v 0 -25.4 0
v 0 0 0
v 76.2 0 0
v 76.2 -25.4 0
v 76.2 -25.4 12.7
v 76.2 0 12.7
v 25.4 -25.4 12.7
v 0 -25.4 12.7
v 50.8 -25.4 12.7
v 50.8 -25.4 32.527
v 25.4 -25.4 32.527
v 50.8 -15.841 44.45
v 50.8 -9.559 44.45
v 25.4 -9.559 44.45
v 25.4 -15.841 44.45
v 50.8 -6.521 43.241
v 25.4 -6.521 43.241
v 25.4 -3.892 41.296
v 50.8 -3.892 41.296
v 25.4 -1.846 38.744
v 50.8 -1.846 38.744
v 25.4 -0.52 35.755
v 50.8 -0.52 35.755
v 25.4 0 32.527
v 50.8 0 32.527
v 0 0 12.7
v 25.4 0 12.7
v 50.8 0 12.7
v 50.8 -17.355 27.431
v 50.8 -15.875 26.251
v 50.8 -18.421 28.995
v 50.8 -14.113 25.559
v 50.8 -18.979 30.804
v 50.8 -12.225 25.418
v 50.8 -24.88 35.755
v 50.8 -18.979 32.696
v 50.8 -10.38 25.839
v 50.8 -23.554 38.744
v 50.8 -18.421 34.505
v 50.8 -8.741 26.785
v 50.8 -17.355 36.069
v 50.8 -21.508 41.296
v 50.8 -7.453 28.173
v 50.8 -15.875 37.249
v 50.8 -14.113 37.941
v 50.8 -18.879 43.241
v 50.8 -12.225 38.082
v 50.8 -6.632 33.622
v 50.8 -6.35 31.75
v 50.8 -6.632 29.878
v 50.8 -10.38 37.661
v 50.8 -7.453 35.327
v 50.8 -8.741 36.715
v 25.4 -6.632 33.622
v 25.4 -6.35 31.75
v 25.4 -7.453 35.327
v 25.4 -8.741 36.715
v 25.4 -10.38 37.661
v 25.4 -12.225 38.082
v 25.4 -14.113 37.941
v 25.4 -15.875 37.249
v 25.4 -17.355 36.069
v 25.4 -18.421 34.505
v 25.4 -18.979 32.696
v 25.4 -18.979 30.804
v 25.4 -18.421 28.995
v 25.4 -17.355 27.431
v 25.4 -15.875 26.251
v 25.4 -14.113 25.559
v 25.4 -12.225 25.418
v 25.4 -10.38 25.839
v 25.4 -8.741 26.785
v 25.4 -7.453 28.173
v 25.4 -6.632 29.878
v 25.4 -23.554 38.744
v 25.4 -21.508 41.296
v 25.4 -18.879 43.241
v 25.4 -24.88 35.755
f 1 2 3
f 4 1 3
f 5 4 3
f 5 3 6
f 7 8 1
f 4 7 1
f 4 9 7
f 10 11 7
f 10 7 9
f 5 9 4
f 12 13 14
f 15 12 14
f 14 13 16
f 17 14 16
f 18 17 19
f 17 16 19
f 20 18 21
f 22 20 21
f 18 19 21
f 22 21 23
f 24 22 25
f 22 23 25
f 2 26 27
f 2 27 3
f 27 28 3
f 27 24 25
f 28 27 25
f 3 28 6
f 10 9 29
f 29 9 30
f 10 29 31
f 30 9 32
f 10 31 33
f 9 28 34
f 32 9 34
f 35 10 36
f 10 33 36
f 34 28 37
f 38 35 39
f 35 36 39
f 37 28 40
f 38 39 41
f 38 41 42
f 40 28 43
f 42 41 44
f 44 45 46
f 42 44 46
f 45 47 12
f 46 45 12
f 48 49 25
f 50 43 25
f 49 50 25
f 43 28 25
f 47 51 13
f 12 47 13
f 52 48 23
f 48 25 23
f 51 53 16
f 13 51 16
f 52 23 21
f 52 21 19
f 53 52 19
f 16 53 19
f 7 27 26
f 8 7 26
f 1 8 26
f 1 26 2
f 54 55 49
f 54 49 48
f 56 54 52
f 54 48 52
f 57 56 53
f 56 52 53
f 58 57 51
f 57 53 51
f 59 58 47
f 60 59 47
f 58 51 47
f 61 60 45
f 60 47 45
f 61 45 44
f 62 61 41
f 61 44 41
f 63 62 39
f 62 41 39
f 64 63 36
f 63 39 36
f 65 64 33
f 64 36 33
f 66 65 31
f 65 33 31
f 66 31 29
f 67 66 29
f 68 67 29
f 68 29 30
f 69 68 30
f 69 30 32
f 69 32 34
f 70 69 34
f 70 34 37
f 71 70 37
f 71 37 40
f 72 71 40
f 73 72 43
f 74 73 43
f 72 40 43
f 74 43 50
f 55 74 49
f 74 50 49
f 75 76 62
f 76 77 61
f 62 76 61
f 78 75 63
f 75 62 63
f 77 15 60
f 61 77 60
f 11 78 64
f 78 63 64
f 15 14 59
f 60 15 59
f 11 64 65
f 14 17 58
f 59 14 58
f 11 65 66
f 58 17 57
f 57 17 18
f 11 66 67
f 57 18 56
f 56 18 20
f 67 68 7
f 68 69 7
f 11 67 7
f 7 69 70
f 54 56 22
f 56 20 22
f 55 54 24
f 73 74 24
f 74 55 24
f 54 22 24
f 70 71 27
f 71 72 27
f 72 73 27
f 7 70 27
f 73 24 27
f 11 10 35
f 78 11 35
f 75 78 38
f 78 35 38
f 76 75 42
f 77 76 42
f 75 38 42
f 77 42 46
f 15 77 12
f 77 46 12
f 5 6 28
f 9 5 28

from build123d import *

# Parameters (mm, degrees)
F1_DEPTH = 25.4
F2_R     = 6.35
F3_DEPTH = 25.4


with BuildPart() as f1:
    # F0 (on Front) → F1 (new body)
    with BuildSketch(Plane.XZ):
        Polygon((0, 12.7), (0, 0), (76.2, 0), (76.2, 12.7), (50.8, 12.7), (50.8, 44.45), (25.4, 44.45), (25.4, 12.7), align=None)
    extrude(amount=F1_DEPTH)

    # F2 (on face) → F3 (cut)
    with BuildSketch(Plane.YZ.offset(50.8)):
        with BuildLine():
            ThreePointArc((-9.5586421261, 44.45), (-2.7865480563, 40.0861130576), (0, 32.5270180545))
            Line((0, 32.5270180545), (0, 44.45))
            Line((0, 44.45), (-9.5586421261, 44.45))
        make_face()
        with BuildLine():
            ThreePointArc((-25.4, 32.5270180545), (-22.6134519437, 40.0861130576), (-15.8413578739, 44.45))
            Line((-15.8413578739, 44.45), (-25.4, 44.45))
            Line((-25.4, 44.45), (-25.4, 32.5270180545))
        make_face()
        with Locations((-12.7, 31.75)):
            Circle(F2_R)
    extrude(amount=-F3_DEPTH, mode=Mode.SUBTRACT)


solid = f1.part
